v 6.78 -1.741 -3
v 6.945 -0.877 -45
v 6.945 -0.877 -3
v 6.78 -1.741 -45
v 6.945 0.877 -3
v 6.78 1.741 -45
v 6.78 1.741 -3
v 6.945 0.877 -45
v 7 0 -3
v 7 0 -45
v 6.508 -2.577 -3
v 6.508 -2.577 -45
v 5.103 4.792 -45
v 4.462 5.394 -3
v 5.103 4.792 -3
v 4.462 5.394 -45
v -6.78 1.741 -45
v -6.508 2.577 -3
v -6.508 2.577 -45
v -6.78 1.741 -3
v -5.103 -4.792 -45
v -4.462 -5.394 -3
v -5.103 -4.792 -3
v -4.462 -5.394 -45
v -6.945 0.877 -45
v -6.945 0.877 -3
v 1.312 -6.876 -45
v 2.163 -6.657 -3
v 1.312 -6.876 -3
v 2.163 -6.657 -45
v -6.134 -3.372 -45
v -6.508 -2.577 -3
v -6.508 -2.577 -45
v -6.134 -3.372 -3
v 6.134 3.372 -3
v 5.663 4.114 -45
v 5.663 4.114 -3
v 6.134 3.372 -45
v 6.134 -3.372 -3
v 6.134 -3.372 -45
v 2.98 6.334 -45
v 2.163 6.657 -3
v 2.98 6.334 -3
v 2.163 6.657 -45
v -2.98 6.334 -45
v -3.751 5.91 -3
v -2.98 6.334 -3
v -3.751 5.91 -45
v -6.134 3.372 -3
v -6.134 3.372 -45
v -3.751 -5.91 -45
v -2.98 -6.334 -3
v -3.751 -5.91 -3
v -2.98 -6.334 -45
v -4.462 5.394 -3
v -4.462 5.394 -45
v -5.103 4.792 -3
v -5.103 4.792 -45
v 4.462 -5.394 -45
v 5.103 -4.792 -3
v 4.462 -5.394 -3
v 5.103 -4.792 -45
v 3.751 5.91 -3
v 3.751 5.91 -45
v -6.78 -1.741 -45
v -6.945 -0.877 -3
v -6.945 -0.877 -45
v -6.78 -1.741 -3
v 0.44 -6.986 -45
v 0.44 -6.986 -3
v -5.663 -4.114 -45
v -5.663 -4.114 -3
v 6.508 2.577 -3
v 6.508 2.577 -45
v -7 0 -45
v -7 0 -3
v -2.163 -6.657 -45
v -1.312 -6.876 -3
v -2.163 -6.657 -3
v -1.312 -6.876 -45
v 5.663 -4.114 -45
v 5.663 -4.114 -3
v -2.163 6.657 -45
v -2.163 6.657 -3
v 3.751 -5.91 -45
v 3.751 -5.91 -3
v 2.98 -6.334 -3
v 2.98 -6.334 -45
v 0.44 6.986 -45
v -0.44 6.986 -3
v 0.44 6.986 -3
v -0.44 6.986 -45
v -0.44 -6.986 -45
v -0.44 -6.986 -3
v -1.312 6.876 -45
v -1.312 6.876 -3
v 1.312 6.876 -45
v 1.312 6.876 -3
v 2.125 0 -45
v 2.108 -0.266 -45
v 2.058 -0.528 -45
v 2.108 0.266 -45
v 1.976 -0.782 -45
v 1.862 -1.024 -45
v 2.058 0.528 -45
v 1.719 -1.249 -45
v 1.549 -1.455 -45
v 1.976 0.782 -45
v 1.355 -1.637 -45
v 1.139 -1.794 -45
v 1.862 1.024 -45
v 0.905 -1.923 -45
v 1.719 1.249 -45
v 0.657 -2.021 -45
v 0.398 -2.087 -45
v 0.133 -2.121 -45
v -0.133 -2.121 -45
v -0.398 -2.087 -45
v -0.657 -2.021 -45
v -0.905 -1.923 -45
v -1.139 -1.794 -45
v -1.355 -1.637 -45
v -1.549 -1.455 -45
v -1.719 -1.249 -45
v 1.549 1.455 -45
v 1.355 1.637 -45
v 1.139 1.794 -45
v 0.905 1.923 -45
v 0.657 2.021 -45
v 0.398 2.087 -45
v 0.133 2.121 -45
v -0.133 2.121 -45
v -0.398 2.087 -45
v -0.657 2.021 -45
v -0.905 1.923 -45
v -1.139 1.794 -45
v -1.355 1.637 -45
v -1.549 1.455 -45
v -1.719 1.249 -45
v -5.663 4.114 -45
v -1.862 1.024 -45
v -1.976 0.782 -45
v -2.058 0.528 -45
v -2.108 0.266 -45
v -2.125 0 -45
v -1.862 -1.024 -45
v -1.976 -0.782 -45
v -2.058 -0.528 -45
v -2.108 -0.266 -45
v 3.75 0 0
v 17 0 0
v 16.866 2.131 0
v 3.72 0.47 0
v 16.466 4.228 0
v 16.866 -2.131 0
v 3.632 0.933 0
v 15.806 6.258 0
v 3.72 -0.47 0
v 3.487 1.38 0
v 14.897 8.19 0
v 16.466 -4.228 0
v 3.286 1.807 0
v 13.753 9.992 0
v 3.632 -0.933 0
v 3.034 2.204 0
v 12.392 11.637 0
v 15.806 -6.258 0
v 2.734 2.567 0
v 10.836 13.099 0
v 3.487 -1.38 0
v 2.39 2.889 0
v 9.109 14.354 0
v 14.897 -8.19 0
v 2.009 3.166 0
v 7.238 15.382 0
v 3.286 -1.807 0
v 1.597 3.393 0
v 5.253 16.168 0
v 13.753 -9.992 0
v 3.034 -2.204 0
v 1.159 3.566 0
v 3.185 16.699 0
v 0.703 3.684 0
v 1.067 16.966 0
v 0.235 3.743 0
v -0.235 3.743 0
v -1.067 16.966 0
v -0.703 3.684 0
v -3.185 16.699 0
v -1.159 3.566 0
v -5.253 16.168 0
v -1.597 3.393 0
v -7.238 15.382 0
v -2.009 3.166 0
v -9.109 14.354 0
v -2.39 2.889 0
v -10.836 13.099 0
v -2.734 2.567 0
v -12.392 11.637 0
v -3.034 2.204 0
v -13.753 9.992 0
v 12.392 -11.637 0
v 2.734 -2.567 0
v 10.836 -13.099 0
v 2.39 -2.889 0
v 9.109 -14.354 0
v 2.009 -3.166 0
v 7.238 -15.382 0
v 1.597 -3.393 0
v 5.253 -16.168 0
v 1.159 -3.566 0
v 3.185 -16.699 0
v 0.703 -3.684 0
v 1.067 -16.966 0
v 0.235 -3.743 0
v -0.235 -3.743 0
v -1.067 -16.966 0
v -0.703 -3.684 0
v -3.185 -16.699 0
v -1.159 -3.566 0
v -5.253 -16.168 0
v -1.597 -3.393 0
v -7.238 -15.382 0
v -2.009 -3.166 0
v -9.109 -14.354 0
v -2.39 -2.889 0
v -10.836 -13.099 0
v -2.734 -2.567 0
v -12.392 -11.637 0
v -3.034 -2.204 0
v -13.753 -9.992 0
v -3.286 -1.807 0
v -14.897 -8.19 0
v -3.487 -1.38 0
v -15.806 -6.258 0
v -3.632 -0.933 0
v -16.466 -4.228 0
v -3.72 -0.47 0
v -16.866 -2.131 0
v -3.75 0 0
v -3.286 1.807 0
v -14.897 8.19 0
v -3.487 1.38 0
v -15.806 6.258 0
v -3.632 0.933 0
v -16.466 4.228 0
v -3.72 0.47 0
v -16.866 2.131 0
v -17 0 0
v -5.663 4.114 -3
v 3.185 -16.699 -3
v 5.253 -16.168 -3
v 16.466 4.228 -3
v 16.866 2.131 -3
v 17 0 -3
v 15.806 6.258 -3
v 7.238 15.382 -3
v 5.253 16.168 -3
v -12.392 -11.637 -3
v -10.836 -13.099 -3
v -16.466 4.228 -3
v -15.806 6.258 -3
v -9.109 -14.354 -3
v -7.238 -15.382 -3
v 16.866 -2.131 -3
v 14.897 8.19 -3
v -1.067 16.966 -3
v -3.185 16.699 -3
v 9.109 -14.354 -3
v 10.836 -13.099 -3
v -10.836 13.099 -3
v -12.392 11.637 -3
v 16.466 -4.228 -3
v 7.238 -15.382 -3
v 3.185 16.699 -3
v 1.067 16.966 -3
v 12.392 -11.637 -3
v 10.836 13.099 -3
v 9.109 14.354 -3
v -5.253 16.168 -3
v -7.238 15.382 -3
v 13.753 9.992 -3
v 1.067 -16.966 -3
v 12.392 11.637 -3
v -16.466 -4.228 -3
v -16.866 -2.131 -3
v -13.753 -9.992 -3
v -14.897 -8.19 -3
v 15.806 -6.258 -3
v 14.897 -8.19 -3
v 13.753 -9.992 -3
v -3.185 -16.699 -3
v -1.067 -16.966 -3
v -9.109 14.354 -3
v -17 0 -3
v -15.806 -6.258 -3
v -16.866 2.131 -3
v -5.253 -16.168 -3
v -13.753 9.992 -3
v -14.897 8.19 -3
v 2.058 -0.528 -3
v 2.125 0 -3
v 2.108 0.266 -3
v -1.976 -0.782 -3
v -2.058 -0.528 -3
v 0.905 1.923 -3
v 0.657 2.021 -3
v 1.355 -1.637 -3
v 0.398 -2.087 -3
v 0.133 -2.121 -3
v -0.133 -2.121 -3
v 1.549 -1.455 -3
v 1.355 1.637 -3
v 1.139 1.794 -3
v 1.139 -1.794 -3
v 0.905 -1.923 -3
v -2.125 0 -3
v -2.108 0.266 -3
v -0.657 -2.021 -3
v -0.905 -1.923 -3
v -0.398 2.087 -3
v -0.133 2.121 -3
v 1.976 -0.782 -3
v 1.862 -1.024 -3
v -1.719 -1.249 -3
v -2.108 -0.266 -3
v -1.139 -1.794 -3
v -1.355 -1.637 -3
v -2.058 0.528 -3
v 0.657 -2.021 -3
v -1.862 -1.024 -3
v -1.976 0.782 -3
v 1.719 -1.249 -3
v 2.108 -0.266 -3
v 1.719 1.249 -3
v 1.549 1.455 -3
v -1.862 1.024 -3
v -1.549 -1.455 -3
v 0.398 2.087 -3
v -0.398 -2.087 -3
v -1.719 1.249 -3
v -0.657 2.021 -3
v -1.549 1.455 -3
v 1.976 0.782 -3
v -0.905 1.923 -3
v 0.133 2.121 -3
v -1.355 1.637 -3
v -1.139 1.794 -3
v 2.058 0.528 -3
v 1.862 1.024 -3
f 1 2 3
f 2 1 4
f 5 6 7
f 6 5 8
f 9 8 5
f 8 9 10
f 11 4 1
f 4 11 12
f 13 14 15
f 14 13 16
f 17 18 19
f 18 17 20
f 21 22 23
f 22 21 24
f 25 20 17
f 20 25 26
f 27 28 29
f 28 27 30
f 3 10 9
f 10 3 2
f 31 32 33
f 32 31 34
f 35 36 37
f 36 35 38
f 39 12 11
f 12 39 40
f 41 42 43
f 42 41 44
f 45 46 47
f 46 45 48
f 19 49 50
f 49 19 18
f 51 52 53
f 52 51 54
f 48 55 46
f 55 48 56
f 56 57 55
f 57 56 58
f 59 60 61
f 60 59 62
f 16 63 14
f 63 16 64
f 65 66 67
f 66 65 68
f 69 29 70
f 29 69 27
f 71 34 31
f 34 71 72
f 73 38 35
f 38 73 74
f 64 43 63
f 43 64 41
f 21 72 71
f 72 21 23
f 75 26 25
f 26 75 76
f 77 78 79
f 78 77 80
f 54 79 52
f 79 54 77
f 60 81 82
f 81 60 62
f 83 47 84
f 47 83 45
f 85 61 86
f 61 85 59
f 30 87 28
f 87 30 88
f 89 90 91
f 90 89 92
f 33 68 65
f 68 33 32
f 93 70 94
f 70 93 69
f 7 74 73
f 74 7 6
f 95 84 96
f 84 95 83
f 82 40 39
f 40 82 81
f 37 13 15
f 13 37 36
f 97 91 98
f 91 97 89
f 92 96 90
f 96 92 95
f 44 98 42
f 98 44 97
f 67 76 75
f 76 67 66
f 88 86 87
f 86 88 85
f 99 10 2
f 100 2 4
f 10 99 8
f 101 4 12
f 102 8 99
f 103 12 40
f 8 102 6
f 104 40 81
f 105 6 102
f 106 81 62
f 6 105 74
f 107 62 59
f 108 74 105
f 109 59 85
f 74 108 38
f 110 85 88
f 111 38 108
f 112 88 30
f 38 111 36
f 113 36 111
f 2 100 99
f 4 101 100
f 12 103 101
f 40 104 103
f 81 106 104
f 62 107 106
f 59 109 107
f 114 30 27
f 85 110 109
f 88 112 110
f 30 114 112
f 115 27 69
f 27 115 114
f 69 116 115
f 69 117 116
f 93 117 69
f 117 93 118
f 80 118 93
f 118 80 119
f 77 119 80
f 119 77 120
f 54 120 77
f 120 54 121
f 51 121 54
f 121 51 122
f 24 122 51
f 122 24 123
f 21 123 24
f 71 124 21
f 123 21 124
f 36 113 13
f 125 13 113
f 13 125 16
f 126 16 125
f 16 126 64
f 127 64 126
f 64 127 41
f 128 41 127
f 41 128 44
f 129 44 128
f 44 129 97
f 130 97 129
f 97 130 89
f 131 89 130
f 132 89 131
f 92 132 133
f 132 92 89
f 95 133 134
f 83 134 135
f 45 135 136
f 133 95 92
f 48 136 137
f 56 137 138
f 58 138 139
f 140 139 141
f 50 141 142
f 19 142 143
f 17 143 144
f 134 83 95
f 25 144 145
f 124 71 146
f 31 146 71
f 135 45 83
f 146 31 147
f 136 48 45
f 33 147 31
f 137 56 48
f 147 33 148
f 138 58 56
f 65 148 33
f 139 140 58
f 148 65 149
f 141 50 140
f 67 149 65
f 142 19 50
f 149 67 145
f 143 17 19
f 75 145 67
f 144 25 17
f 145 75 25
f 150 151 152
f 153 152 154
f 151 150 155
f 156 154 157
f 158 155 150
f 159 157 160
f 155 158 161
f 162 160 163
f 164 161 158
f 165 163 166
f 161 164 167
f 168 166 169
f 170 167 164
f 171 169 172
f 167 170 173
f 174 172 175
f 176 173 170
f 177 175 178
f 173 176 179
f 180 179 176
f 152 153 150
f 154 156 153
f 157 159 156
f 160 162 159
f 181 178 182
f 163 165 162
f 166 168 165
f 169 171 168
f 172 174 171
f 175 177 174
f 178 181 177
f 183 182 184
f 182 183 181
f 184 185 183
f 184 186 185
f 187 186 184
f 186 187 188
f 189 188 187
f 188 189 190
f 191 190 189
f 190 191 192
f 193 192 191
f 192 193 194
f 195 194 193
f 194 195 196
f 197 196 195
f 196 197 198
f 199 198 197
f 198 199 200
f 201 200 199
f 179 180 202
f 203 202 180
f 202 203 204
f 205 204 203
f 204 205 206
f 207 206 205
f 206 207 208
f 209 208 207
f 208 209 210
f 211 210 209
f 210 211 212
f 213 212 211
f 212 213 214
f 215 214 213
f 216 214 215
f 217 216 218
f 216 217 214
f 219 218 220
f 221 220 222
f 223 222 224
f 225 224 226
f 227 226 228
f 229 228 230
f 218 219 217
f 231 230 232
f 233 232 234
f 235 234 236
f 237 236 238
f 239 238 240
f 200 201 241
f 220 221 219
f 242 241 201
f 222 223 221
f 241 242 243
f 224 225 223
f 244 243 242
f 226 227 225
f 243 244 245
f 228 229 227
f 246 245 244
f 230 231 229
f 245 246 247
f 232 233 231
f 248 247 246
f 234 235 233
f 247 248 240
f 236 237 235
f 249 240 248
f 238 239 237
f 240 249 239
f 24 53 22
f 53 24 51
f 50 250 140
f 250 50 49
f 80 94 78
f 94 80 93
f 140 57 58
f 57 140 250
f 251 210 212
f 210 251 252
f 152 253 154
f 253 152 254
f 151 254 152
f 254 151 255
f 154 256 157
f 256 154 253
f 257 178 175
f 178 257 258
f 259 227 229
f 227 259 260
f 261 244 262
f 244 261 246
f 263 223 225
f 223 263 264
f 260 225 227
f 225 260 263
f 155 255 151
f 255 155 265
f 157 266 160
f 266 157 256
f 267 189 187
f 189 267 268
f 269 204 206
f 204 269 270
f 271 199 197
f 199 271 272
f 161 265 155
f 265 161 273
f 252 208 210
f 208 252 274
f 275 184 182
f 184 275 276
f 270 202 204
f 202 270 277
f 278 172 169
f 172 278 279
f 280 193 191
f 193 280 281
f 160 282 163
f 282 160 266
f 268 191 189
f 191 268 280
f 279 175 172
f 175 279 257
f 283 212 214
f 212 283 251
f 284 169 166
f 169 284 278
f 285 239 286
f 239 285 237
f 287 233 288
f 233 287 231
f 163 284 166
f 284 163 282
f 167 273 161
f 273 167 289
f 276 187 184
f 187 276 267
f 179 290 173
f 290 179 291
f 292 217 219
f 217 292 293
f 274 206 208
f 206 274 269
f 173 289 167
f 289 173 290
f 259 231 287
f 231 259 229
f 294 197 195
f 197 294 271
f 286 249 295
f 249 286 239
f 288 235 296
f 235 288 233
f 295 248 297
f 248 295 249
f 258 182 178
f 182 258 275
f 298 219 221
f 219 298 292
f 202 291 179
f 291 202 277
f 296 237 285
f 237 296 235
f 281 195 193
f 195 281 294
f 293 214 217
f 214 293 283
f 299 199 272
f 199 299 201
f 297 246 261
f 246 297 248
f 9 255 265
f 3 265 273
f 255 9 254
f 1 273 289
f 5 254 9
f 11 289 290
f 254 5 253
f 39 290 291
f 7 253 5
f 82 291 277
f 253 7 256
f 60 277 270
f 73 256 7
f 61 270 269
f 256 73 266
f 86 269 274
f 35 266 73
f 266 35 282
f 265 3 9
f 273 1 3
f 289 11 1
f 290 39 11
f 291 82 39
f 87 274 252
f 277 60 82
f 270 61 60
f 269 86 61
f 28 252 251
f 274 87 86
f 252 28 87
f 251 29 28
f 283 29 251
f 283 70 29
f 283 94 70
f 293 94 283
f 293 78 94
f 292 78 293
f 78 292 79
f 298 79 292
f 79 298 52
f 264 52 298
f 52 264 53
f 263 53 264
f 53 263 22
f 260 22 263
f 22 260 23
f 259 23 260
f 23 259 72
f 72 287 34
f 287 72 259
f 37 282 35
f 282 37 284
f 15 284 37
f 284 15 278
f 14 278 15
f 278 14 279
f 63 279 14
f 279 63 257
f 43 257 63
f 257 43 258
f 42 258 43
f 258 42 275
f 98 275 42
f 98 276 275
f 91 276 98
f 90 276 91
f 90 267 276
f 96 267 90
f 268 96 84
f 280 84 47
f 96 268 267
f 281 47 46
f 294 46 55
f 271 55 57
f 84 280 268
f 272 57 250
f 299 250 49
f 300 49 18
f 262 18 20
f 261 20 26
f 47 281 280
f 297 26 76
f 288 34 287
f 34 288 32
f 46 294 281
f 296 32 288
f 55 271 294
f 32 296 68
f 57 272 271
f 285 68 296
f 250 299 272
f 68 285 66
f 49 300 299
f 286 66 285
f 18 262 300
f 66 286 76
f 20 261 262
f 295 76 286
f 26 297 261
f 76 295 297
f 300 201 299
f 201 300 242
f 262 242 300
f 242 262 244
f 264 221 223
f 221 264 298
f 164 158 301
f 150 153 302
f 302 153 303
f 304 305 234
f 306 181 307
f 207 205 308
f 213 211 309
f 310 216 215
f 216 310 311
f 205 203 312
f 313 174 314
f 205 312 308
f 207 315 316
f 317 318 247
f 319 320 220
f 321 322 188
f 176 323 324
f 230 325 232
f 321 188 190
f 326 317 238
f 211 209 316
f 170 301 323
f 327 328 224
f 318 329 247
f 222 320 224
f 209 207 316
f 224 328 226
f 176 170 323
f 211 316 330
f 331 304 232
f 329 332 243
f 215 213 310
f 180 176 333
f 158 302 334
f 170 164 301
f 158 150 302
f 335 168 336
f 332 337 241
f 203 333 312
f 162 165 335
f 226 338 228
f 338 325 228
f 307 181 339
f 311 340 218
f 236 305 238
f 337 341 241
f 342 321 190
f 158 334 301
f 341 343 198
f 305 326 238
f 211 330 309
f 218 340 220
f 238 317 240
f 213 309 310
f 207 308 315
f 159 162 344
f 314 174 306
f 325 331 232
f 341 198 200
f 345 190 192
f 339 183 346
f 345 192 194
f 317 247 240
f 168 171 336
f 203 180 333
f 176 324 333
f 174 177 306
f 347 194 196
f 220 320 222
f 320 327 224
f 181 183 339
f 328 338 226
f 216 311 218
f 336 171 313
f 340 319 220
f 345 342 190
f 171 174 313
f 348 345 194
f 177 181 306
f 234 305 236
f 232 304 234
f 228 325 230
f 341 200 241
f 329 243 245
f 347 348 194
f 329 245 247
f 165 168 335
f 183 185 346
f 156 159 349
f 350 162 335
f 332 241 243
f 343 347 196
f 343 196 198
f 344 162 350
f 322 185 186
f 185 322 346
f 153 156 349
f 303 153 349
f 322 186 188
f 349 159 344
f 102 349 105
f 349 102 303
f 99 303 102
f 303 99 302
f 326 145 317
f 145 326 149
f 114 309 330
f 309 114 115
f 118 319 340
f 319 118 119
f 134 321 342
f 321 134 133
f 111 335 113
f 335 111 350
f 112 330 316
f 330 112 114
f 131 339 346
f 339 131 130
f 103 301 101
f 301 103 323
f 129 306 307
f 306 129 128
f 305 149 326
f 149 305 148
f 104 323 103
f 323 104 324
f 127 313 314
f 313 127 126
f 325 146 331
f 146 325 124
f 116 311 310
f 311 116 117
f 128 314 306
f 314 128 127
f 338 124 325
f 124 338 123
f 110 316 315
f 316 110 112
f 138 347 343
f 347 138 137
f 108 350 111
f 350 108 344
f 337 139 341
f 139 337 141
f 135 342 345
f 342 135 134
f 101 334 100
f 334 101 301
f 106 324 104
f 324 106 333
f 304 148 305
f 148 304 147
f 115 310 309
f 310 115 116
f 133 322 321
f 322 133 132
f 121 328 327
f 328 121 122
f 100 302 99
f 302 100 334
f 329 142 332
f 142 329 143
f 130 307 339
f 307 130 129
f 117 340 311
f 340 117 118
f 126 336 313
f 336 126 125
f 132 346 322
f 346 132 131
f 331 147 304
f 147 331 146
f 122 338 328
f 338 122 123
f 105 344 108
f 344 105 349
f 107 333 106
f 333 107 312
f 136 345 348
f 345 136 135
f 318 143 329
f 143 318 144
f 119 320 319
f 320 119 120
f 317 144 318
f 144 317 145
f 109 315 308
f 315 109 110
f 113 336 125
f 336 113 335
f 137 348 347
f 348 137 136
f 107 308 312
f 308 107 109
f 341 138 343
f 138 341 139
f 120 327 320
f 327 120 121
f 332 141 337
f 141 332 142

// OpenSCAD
$fn = 50;


difference() {
	union() {
		translate(v = [0, 0, -45.0000000000]) {
			cylinder(h = 45, r = 7.0000000000);
		}
		translate(v = [0, 0, -3.0000000000]) {
			cylinder(h = 3, r = 17.0000000000);
		}
	}
	union() {
		translate(v = [0, 0, 0]) {
			rotate(a = [0, 0, 0]) {
				difference() {
					union() {
						#translate(v = [0, 0, -45.0000000000]) {
							cylinder(h = 45, r = 2.0000000000);
						}
						#translate(v = [0, 0, -3]) {
							cylinder(h = 3, r1 = 2.1250000000, r2 = 3.7500000000);
						}
						#translate(v = [0, 0, -45.0000000000]) {
							cylinder(h = 45, r = 2.1250000000);
						}
						#translate(v = [0, 0, -45.0000000000]) {
							cylinder(h = 45, r = 2.0000000000);
						}
					}
					union();
				}
			}
		}
	}
}
